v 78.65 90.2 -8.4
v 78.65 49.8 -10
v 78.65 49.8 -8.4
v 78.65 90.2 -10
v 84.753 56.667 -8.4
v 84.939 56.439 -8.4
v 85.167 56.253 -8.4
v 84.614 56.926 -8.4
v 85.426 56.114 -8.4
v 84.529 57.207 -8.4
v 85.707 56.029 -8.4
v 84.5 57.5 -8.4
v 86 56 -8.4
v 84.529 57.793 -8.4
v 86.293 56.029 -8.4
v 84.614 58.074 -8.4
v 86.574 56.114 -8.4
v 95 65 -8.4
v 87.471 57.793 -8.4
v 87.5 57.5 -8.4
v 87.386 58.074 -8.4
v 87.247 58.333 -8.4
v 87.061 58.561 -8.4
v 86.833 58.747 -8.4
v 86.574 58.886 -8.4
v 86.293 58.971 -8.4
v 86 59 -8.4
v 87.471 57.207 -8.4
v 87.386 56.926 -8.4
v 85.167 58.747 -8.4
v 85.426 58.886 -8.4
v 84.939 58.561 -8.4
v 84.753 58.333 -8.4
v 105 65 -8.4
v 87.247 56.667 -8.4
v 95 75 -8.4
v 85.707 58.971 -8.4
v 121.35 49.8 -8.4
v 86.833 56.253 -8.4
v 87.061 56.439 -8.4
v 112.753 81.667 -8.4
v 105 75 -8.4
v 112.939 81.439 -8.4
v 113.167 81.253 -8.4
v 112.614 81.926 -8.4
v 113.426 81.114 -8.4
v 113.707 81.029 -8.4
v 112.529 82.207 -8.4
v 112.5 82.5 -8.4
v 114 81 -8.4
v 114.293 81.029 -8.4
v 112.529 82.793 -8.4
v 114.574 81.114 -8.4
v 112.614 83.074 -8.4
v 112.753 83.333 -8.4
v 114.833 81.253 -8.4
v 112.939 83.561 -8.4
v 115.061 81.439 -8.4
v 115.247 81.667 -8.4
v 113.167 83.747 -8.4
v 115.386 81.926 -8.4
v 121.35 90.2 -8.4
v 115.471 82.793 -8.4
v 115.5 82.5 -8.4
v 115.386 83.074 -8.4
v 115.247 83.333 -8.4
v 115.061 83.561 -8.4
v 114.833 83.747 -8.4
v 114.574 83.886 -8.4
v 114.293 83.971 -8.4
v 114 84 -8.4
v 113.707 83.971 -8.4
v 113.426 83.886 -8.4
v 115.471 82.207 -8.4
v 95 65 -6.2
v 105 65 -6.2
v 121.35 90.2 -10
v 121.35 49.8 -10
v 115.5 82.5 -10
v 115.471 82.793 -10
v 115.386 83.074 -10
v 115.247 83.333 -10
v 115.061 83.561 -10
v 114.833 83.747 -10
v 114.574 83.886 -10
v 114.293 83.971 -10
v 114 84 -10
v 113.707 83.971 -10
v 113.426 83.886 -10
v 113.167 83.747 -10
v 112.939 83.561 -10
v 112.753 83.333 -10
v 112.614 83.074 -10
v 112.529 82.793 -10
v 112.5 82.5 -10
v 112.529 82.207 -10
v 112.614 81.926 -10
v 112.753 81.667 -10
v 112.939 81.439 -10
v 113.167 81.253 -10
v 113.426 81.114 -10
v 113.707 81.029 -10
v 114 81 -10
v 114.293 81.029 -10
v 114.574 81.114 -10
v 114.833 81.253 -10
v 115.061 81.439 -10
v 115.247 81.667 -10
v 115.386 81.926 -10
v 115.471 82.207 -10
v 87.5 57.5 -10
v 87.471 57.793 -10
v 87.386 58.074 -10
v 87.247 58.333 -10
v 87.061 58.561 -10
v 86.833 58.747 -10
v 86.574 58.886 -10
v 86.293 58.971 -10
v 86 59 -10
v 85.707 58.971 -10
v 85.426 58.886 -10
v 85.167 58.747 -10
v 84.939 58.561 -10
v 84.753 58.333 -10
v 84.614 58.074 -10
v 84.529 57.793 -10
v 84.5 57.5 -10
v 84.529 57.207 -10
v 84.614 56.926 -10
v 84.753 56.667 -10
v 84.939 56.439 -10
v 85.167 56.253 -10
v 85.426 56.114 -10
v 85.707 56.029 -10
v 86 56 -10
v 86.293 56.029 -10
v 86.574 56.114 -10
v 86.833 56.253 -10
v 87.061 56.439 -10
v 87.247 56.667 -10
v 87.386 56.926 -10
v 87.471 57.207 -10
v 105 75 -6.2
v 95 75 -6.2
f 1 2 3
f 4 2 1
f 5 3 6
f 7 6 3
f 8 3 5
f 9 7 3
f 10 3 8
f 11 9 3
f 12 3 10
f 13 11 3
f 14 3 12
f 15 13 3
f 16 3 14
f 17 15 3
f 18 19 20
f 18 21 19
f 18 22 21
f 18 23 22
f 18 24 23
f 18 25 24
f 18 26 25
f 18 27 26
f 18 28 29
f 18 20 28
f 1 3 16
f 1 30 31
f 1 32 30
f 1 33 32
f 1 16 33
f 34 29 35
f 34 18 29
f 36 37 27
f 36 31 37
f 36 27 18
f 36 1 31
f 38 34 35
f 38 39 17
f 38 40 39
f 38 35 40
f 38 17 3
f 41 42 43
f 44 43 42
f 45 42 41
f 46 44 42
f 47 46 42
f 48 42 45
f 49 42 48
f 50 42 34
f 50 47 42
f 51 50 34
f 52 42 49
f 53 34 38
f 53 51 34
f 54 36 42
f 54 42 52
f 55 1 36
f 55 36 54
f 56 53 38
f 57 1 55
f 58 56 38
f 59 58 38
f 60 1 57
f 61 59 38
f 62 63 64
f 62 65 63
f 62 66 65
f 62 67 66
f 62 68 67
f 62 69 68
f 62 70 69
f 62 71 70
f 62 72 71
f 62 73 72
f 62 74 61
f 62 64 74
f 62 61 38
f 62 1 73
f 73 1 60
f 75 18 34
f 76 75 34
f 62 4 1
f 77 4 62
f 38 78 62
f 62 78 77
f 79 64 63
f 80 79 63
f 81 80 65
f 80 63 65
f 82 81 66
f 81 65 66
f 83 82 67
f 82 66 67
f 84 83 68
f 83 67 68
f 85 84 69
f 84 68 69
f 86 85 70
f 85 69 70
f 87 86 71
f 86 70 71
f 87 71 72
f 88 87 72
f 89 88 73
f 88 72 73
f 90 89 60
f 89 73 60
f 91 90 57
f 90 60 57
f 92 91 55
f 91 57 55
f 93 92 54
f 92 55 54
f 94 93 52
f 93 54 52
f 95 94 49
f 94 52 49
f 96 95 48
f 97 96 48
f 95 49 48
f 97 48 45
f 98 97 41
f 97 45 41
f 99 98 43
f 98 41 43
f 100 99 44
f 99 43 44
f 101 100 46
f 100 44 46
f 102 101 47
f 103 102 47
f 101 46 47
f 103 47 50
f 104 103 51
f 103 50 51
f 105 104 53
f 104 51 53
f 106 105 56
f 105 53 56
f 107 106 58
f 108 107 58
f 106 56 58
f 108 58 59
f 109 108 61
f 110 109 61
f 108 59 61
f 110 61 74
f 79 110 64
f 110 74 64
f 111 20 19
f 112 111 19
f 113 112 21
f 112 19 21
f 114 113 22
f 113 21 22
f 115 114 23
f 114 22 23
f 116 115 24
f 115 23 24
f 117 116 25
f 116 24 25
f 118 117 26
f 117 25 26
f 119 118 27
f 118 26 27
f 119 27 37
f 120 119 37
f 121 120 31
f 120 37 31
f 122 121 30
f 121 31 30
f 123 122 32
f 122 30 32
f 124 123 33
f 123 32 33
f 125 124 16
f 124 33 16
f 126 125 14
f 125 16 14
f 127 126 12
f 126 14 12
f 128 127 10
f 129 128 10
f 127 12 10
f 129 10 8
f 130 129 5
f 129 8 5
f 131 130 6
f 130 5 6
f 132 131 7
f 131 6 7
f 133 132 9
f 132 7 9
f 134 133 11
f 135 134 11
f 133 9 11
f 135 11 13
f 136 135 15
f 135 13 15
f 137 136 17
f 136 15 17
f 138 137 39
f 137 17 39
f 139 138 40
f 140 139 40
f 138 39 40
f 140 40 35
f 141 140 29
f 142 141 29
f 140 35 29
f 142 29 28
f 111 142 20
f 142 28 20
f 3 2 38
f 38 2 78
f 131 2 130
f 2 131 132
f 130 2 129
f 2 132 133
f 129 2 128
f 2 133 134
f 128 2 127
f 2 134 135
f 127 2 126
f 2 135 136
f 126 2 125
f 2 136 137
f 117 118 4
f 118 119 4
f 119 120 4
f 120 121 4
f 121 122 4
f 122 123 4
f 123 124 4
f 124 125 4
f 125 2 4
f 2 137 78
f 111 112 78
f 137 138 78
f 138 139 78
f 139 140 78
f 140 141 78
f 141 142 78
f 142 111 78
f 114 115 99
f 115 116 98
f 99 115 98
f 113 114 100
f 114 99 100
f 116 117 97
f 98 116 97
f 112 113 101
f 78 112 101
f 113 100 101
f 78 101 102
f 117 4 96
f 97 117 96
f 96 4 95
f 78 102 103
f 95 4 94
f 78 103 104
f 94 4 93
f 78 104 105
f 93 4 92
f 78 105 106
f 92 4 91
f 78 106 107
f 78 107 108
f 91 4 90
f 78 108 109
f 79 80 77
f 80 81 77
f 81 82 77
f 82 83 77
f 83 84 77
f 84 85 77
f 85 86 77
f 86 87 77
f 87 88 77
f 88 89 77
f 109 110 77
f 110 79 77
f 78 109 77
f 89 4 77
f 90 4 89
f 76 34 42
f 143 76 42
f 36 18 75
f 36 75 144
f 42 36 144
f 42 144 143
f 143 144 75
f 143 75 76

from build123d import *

# Parameters (mm, degrees)
V10_NFC_V3_REFERENCE42P7X40P4_START       = -10
SKETCH_2_W                                = 42.7
SKETCH_2_H                                = 40.4
V10_NFC_V3_REFERENCE42P7X40P4_DEPTH       = 1.6
V10_NFC_CENTRAL_COMPONENT_REFERENCE_START = -8.4
SKETCH_3_W                                = 10
SKETCH_3_H                                = 10
V10_NFC_CENTRAL_COMPONENT_REFERENCE_DEPTH = 2.2
SKETCH_5_R                                = 1.5
V12_NFC_TWO_DIAGONAL_PHOTO_HOLES_D3_DEPTH = 1.6


with BuildPart() as part:
    # 草图2 → V10_NFC_V3_reference42p7x40p4 (new body)
    with BuildSketch(Plane.XY.offset(V10_NFC_V3_REFERENCE42P7X40P4_START)):
        with Locations((100, 70)):
            Rectangle(SKETCH_2_W, SKETCH_2_H)
    extrude(amount=V10_NFC_V3_REFERENCE42P7X40P4_DEPTH)

    # 草图3 → V10_NFC_central_component_reference (add)
    with BuildSketch(Plane.XY.offset(V10_NFC_CENTRAL_COMPONENT_REFERENCE_START)):
        with Locations((100, 70)):
            Rectangle(SKETCH_3_W, SKETCH_3_H)
    extrude(amount=V10_NFC_CENTRAL_COMPONENT_REFERENCE_DEPTH)

    # 草图5 → V12_NFC_two_diagonal_photo_holes_D3 (cut)
    with BuildSketch(Plane.XY.offset(-8.4)):
        with Locations((86, 57.5)):
            Circle(SKETCH_5_R)
        with Locations((114, 82.5)):
            Circle(SKETCH_5_R)
    extrude(amount=-V12_NFC_TWO_DIAGONAL_PHOTO_HOLES_D3_DEPTH, mode=Mode.SUBTRACT)


solid = part.part
